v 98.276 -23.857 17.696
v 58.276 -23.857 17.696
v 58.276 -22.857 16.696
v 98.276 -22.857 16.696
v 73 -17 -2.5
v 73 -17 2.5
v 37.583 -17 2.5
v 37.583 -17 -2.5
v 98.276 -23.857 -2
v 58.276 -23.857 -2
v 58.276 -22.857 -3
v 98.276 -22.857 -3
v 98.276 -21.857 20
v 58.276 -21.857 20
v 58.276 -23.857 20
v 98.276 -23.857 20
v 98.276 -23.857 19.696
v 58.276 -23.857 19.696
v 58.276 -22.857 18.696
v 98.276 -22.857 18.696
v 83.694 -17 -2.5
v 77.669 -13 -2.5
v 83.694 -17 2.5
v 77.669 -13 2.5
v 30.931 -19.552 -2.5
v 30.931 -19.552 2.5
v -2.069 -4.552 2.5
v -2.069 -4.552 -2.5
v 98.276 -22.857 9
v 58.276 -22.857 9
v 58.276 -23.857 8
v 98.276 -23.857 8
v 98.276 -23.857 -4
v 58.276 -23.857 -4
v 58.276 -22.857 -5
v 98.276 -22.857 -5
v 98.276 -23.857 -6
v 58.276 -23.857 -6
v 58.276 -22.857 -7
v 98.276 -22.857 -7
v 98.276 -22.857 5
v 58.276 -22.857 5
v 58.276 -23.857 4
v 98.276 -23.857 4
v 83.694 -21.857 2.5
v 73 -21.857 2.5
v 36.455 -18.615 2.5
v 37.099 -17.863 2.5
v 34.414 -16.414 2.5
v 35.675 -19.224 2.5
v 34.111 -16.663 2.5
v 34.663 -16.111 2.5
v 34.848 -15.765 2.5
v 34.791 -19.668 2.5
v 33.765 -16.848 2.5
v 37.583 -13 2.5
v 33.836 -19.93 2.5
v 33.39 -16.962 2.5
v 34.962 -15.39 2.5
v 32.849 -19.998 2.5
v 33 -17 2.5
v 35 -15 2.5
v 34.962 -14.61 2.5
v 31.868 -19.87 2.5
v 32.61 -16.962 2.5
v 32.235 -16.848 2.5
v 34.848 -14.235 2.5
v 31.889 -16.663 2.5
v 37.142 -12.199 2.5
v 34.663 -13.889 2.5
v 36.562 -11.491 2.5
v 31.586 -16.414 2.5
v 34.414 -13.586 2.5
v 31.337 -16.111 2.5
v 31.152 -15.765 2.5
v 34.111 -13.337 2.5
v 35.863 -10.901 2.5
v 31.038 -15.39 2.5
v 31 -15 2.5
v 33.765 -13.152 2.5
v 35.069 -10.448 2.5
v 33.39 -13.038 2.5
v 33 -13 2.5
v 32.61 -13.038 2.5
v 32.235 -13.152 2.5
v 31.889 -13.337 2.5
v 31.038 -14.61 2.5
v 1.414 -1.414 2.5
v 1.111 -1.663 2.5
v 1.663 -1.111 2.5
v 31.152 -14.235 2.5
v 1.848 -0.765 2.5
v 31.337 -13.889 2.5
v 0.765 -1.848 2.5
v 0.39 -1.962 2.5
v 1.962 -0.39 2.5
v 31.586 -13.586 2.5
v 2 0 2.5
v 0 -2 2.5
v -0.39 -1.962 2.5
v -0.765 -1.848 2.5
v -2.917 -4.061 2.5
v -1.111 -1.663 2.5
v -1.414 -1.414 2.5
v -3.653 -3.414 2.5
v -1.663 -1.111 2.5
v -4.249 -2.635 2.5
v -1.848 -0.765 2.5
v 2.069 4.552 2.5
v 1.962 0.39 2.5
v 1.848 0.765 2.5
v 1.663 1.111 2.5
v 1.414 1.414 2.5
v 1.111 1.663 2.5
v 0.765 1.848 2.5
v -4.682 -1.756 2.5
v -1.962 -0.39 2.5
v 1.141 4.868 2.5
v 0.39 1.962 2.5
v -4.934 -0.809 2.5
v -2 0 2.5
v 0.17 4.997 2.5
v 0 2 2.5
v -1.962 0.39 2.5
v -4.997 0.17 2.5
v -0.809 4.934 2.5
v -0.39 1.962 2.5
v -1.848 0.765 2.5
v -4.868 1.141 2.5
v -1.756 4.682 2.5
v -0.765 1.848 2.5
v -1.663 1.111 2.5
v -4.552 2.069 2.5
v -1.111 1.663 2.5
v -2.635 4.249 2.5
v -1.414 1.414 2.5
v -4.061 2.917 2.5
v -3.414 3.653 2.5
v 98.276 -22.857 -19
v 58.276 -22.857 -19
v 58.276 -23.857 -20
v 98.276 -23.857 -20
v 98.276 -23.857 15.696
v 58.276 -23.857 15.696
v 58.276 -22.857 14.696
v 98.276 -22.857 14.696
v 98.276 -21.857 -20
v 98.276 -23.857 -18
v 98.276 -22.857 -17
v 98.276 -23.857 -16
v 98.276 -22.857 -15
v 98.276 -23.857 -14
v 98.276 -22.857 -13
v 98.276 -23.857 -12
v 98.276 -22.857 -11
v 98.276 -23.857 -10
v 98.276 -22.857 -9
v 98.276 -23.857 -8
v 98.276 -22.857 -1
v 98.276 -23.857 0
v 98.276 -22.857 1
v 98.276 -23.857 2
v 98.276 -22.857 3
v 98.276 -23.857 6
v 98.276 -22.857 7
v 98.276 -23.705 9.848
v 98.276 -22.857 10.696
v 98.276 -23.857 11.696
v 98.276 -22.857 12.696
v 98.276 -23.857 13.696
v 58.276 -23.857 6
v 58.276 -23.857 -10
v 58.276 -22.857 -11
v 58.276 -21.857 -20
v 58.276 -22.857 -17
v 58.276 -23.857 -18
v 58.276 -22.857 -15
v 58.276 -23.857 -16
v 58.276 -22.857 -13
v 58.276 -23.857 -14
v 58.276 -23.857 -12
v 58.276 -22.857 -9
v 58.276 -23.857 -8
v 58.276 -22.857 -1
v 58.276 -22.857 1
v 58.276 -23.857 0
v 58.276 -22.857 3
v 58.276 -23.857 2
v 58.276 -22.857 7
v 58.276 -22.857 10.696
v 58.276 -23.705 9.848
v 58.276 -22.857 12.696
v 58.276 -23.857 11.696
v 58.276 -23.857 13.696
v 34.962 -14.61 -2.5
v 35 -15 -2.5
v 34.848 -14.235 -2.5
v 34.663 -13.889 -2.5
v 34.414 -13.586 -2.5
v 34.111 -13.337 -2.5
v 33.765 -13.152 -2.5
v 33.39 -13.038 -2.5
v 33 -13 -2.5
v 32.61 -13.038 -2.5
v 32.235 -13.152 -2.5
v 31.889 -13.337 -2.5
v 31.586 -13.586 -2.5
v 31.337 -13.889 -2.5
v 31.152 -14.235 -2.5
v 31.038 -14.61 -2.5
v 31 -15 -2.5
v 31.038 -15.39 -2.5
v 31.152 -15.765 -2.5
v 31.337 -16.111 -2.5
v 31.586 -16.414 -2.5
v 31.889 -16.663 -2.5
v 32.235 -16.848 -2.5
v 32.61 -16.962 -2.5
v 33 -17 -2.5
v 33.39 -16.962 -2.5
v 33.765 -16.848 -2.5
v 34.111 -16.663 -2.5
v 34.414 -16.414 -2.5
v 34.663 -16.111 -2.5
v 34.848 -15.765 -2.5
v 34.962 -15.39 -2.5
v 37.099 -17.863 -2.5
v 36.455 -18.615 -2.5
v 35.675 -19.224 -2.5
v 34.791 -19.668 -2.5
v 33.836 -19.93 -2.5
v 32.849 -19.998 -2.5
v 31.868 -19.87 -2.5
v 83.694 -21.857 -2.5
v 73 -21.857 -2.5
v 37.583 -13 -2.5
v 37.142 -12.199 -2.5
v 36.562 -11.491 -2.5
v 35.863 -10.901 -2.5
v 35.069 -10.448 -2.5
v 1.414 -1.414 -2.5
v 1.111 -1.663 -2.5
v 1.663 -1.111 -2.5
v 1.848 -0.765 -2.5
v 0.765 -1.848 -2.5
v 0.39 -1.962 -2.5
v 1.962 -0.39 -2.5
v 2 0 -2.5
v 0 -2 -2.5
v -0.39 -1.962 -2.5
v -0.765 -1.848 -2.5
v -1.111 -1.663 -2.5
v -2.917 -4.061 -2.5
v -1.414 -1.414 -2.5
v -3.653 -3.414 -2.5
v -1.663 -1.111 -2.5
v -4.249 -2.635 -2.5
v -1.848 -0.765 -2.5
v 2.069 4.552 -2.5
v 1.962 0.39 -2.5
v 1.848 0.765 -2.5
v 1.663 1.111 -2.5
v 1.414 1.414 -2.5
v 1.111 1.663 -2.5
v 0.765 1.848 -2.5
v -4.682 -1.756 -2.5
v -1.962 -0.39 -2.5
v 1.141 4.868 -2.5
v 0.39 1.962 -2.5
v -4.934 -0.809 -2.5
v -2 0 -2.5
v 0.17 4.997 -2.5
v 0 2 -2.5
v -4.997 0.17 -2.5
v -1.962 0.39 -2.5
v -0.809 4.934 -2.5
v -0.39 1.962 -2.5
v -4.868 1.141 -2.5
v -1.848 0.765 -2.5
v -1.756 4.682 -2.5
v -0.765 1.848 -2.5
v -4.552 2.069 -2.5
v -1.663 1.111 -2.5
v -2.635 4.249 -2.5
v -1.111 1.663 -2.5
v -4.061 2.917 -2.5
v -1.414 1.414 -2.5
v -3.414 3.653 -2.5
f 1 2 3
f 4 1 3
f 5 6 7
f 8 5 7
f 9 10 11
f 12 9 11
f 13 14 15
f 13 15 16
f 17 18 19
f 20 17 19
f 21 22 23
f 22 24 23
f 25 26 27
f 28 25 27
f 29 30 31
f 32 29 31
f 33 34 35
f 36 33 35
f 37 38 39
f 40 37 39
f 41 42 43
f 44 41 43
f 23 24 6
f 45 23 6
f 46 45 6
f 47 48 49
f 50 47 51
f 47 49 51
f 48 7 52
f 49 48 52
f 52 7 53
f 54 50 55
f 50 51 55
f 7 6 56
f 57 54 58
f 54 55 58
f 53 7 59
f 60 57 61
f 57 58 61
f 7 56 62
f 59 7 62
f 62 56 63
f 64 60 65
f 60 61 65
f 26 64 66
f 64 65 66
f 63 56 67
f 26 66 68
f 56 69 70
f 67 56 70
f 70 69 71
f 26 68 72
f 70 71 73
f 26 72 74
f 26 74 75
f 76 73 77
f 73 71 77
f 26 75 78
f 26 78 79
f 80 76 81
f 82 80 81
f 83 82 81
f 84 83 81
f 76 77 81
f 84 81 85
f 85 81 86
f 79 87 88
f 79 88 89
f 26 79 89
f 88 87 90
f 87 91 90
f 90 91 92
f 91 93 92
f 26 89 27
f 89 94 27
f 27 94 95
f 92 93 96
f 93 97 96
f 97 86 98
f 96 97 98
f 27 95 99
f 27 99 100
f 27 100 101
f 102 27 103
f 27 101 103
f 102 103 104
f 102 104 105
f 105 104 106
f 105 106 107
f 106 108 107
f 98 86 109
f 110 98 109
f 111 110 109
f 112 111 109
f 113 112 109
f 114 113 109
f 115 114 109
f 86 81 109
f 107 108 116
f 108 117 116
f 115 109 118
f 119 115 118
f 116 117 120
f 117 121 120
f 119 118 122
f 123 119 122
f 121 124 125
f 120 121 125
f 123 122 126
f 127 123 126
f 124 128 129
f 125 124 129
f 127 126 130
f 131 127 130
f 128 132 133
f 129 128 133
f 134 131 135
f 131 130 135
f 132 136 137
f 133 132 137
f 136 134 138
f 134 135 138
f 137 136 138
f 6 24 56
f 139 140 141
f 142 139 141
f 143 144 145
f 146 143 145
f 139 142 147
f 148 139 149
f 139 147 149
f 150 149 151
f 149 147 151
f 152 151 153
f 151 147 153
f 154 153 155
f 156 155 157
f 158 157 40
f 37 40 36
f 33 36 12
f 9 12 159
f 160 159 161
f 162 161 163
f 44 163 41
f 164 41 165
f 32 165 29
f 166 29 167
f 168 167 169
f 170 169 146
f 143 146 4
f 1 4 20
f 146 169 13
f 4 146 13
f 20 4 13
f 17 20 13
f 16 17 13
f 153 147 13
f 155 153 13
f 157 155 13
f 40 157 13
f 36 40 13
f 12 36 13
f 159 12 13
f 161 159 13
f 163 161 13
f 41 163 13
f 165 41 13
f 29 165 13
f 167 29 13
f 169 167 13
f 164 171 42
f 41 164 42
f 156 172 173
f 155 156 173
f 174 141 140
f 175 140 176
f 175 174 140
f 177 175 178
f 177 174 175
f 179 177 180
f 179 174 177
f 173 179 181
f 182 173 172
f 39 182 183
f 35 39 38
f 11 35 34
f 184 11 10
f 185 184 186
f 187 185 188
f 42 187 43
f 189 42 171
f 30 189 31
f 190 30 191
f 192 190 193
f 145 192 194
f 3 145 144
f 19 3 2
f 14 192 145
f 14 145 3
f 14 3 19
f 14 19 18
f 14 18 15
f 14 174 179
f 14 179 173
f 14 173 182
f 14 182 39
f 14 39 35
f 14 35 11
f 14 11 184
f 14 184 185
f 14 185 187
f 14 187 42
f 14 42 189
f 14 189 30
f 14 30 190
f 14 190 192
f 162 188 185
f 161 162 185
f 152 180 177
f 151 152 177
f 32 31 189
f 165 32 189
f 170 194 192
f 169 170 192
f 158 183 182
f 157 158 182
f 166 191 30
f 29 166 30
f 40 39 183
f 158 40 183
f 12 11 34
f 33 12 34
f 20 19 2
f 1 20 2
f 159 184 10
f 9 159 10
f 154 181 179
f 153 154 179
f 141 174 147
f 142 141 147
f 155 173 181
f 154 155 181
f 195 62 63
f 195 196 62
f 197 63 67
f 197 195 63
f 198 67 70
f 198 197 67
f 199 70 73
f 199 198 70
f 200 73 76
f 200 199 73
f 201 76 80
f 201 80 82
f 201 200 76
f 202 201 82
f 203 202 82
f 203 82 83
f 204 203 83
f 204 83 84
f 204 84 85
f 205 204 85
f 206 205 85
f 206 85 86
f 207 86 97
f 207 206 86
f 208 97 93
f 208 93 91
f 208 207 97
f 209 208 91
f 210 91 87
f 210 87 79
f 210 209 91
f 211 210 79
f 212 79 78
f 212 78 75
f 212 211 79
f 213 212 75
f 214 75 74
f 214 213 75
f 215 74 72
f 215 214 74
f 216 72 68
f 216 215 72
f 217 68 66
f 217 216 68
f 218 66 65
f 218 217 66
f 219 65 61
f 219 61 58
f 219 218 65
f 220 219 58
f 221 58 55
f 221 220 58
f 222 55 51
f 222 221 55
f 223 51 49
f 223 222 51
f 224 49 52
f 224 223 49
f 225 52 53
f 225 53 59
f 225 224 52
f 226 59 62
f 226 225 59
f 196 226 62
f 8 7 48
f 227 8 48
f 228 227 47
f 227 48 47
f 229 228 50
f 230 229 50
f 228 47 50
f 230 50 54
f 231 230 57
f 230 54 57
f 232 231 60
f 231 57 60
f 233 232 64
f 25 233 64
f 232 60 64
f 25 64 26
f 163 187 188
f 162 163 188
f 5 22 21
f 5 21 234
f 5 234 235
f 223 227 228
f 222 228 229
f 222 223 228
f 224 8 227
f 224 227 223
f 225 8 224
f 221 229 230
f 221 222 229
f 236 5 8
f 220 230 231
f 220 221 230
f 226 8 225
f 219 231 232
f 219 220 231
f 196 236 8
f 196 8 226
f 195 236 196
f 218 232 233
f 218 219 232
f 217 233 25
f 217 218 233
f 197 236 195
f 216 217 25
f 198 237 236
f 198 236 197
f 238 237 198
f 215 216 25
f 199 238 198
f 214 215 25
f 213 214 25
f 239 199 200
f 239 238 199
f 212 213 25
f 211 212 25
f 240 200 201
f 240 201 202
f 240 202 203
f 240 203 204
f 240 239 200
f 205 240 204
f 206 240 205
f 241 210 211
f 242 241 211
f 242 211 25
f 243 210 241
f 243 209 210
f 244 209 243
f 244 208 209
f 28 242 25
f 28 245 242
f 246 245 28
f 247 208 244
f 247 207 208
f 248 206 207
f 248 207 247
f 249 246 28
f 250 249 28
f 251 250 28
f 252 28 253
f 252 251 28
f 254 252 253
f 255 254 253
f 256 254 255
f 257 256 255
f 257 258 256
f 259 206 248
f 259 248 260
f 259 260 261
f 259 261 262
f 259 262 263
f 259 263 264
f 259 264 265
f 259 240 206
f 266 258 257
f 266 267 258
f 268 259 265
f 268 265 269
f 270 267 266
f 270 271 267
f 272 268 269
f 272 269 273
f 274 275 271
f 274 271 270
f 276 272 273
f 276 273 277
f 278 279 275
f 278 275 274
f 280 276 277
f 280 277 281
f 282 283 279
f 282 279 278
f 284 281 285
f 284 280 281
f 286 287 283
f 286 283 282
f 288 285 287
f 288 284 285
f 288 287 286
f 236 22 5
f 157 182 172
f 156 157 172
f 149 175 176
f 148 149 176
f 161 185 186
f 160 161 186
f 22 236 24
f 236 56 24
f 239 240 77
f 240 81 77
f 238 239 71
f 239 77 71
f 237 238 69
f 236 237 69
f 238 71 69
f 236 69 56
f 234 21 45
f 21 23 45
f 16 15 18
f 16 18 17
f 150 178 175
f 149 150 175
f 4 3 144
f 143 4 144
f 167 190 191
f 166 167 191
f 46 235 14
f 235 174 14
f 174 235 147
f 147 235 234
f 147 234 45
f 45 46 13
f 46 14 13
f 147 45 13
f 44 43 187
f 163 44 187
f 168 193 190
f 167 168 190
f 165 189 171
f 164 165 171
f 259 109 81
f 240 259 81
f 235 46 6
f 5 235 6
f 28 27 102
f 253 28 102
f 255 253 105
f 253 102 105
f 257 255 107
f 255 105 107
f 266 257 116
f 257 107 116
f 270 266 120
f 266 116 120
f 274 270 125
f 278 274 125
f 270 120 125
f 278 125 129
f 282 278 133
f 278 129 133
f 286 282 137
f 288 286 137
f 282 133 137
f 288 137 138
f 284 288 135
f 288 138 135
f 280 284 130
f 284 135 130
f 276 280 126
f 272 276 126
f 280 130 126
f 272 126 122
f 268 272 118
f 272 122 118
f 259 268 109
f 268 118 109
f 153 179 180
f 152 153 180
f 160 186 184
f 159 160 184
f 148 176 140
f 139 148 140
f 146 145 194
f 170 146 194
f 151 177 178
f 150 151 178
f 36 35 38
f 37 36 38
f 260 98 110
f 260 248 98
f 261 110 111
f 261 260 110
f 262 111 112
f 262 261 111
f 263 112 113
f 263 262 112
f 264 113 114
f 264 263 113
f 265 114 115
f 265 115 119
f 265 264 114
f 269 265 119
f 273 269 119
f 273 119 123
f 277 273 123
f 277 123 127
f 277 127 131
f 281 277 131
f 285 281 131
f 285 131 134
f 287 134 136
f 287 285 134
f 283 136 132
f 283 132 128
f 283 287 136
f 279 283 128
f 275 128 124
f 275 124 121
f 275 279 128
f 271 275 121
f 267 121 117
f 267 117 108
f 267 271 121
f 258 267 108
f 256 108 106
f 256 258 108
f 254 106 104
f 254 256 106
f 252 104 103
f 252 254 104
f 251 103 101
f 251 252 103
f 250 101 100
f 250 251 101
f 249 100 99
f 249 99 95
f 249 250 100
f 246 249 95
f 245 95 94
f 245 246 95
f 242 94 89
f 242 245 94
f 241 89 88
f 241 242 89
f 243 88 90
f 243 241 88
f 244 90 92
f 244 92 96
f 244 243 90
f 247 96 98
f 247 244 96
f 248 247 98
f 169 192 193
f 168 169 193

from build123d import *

# Parameters (mm, degrees)
SKETCH_1_R          = 2
EXTRUDE_1_DEPTH     = 2.5
SKETCH_2_W          = 40
SKETCH_2_H          = 40
EXTRUDE_2_DEPTH     = 2
CUT_EXTRUDE_1_DEPTH = 40


with BuildPart() as part:
    # 草图1 → 凸台-拉伸1 (new, symmetric)
    with BuildSketch(Plane.XY):
        with BuildLine():
            Line((2.069014722, 4.551832387), (35.069014722, -10.448167613))
            ThreePointArc((35.069014722, -10.448167613), (36.562144846, -11.491278851), (37.582575695, -13))
            Line((37.582575695, -13), (73, -13))
            Line((73, -13), (77.669363216, -13))
            Line((77.669363216, -13), (83.69352751, -17))
            Line((83.69352751, -17), (83.69352751, -21.856832822))
            Line((83.69352751, -21.856832822), (73, -21.856832822))
            Line((73, -21.856832822), (73, -17))
            Line((73, -17), (37.582575695, -17))
            ThreePointArc((37.582575695, -17), (34.790938113, -19.668248138), (30.930985278, -19.551832387))
            Line((30.930985278, -19.551832387), (-2.069014722, -4.551832387))
            ThreePointArc((-2.069014722, -4.551832387), (-4.551832387, 2.069014722), (2.069014722, 4.551832387))
        make_face()
        Circle(SKETCH_1_R, mode=Mode.SUBTRACT)
        with Locations((33, -15)):
            Circle(SKETCH_1_R, mode=Mode.SUBTRACT)
    extrude(amount=EXTRUDE_1_DEPTH, both=True)

    # 草图2 → 凸台-拉伸2 (add)
    with BuildSketch(Plane.XZ.offset(21.856832822)):
        with Locations((78.275712014, 0)):
            Rectangle(SKETCH_2_W, SKETCH_2_H)
    extrude(amount=EXTRUDE_2_DEPTH)

    # 草图4 → 切除-拉伸1 (cut)
    with BuildSketch(Plane.ZY.offset(-58.275712014)):
        Polygon((-19, -22.856832822), (-20, -23.856832822), (-18, -23.856832822), align=None)
        Polygon((-17, -22.856832822), (-18, -23.856832822), (-16, -23.856832822), align=None)
        Polygon((-15, -22.856832822), (-16, -23.856832822), (-14, -23.856832822), align=None)
        Polygon((-13, -22.856832822), (-14, -23.856832822), (-12, -23.856832822), align=None)
        Polygon((-11, -22.856832822), (-12, -23.856832822), (-10, -23.856832822), align=None)
        Polygon((-9, -22.856832822), (-10, -23.856832822), (-8, -23.856832822), align=None)
        Polygon((-7, -22.856832822), (-8, -23.856832822), (-6, -23.856832822), align=None)
        Polygon((-5, -22.856832822), (-6, -23.856832822), (-4, -23.856832822), align=None)
        Polygon((-3, -22.856832822), (-4, -23.856832822), (-2, -23.856832822), align=None)
        Polygon((-1, -22.856832822), (-2, -23.856832822), (0, -23.856832822), align=None)
        Polygon((1, -22.856832822), (0, -23.856832822), (2, -23.856832822), align=None)
        Polygon((3, -22.856832822), (2, -23.856832822), (4, -23.856832822), align=None)
        Polygon((5, -22.856832822), (4, -23.856832822), (6, -23.856832822), align=None)
        Polygon((7, -22.856832822), (6, -23.856832822), (8, -23.856832822), align=None)
        Polygon((9, -22.856832822), (8, -23.856832822), (11.695910697, -23.856832822), (10.695910697, -22.856832822), (9.847955349, -23.70478817), align=None)
        Polygon((12.695910697, -22.856832822), (11.695910697, -23.856832822), (13.695910697, -23.856832822), align=None)
        Polygon((18.695910697, -22.856832822), (17.695910697, -23.856832822), (19.695910697, -23.856832822), align=None)
        Polygon((16.695910697, -22.856832822), (15.695910697, -23.856832822), (17.695910697, -23.856832822), align=None)
        Polygon((14.695910697, -22.856832822), (13.695910697, -23.856832822), (15.695910697, -23.856832822), align=None)
    extrude(amount=-CUT_EXTRUDE_1_DEPTH, mode=Mode.SUBTRACT)


solid = part.part
